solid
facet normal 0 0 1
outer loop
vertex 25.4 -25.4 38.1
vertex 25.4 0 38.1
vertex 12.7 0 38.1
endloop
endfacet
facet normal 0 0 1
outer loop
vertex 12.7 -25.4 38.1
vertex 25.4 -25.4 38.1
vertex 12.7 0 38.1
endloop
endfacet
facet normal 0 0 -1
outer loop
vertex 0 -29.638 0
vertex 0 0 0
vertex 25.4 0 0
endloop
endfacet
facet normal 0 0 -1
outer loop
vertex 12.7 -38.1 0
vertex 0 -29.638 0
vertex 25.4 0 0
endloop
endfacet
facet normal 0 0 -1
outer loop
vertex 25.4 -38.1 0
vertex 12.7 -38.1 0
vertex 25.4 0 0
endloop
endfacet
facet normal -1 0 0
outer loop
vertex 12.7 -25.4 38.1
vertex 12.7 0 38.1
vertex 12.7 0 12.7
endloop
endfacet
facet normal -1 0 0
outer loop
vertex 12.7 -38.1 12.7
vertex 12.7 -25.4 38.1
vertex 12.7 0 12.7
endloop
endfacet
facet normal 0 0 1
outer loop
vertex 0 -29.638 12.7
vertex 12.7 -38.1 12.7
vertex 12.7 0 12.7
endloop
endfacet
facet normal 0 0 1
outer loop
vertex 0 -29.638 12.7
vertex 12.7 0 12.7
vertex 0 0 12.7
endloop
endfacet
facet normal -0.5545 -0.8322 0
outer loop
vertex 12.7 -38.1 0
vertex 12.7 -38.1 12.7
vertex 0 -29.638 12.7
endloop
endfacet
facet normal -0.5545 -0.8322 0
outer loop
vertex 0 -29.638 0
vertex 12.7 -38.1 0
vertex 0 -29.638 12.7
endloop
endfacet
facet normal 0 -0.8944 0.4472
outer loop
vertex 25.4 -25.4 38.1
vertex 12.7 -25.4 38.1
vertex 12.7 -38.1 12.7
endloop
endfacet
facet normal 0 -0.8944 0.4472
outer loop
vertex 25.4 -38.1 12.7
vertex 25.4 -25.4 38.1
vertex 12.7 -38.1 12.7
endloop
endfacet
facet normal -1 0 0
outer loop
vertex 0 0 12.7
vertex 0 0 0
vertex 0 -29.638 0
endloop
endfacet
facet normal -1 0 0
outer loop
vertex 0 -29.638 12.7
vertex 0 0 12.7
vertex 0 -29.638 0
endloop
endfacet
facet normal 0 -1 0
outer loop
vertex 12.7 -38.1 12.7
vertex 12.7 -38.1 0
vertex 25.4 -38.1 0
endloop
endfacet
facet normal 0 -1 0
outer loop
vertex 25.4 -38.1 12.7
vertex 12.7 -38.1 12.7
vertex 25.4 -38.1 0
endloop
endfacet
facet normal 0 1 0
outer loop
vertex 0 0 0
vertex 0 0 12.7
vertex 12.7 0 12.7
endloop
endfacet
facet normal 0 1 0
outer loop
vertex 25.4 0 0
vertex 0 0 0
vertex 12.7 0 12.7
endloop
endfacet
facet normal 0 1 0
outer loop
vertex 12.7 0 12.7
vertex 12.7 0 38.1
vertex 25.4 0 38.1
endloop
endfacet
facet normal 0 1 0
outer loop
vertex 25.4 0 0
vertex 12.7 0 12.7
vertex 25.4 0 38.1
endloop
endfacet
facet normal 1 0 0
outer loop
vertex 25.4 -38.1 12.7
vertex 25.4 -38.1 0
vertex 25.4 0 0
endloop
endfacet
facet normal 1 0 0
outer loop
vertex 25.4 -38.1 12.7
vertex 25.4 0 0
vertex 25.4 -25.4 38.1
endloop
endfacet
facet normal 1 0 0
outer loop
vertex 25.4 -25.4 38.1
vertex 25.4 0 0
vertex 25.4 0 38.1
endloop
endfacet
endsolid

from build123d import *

# Parameters (mm, degrees)
F1_DEPTH = 38.1
F3_DEPTH = 12.7
F5_DEPTH = 12.7
F6_DEPTH = 25.4
F8_DEPTH = 12.7


with BuildPart() as f1:
    # F0 (on Front) → F1 (new body)
    with BuildSketch(Plane.XZ):
        Polygon((0, 12.7), (0, 0), (25.4, 0), (25.4, 38.1), (12.7, 38.1), (12.7, 12.7), align=None)
    extrude(amount=F1_DEPTH)

    # F2 (on face) → F3 (cut)
    with BuildSketch(Plane(origin=(12.7, 0, 0), x_dir=(0, -1, 0), z_dir=(-1, 0, 0))):
        Polygon((38.1, 38.1), (25.4, 38.1), (38.1, 12.7), align=None)
    extrude(amount=-F3_DEPTH, mode=Mode.SUBTRACT)

    # F4 (on face) → F5 (join)
    with BuildSketch(Plane.XY.offset(12.7)):
        Polygon((0, -38.1), (12.7, -38.1), (0, -31.632963568), align=None)
    extrude(amount=F5_DEPTH)

    # F6 (cut): a face of the model
    f6_faces = [f1.faces().sort_by_distance(p)[0] for p in [
        (6.35, -34.866481784, 19.05),
    ]]
    extrude(f6_faces, amount=-F6_DEPTH, mode=Mode.SUBTRACT)

    # F7 (on face) → F8 (cut)
    with BuildSketch(Plane.XY.offset(12.7)):
        Polygon((12.7, -38.1), (0, -29.6376030892), (0, -38.1), align=None)
    extrude(amount=-F8_DEPTH, mode=Mode.SUBTRACT)


solid = f1.part
